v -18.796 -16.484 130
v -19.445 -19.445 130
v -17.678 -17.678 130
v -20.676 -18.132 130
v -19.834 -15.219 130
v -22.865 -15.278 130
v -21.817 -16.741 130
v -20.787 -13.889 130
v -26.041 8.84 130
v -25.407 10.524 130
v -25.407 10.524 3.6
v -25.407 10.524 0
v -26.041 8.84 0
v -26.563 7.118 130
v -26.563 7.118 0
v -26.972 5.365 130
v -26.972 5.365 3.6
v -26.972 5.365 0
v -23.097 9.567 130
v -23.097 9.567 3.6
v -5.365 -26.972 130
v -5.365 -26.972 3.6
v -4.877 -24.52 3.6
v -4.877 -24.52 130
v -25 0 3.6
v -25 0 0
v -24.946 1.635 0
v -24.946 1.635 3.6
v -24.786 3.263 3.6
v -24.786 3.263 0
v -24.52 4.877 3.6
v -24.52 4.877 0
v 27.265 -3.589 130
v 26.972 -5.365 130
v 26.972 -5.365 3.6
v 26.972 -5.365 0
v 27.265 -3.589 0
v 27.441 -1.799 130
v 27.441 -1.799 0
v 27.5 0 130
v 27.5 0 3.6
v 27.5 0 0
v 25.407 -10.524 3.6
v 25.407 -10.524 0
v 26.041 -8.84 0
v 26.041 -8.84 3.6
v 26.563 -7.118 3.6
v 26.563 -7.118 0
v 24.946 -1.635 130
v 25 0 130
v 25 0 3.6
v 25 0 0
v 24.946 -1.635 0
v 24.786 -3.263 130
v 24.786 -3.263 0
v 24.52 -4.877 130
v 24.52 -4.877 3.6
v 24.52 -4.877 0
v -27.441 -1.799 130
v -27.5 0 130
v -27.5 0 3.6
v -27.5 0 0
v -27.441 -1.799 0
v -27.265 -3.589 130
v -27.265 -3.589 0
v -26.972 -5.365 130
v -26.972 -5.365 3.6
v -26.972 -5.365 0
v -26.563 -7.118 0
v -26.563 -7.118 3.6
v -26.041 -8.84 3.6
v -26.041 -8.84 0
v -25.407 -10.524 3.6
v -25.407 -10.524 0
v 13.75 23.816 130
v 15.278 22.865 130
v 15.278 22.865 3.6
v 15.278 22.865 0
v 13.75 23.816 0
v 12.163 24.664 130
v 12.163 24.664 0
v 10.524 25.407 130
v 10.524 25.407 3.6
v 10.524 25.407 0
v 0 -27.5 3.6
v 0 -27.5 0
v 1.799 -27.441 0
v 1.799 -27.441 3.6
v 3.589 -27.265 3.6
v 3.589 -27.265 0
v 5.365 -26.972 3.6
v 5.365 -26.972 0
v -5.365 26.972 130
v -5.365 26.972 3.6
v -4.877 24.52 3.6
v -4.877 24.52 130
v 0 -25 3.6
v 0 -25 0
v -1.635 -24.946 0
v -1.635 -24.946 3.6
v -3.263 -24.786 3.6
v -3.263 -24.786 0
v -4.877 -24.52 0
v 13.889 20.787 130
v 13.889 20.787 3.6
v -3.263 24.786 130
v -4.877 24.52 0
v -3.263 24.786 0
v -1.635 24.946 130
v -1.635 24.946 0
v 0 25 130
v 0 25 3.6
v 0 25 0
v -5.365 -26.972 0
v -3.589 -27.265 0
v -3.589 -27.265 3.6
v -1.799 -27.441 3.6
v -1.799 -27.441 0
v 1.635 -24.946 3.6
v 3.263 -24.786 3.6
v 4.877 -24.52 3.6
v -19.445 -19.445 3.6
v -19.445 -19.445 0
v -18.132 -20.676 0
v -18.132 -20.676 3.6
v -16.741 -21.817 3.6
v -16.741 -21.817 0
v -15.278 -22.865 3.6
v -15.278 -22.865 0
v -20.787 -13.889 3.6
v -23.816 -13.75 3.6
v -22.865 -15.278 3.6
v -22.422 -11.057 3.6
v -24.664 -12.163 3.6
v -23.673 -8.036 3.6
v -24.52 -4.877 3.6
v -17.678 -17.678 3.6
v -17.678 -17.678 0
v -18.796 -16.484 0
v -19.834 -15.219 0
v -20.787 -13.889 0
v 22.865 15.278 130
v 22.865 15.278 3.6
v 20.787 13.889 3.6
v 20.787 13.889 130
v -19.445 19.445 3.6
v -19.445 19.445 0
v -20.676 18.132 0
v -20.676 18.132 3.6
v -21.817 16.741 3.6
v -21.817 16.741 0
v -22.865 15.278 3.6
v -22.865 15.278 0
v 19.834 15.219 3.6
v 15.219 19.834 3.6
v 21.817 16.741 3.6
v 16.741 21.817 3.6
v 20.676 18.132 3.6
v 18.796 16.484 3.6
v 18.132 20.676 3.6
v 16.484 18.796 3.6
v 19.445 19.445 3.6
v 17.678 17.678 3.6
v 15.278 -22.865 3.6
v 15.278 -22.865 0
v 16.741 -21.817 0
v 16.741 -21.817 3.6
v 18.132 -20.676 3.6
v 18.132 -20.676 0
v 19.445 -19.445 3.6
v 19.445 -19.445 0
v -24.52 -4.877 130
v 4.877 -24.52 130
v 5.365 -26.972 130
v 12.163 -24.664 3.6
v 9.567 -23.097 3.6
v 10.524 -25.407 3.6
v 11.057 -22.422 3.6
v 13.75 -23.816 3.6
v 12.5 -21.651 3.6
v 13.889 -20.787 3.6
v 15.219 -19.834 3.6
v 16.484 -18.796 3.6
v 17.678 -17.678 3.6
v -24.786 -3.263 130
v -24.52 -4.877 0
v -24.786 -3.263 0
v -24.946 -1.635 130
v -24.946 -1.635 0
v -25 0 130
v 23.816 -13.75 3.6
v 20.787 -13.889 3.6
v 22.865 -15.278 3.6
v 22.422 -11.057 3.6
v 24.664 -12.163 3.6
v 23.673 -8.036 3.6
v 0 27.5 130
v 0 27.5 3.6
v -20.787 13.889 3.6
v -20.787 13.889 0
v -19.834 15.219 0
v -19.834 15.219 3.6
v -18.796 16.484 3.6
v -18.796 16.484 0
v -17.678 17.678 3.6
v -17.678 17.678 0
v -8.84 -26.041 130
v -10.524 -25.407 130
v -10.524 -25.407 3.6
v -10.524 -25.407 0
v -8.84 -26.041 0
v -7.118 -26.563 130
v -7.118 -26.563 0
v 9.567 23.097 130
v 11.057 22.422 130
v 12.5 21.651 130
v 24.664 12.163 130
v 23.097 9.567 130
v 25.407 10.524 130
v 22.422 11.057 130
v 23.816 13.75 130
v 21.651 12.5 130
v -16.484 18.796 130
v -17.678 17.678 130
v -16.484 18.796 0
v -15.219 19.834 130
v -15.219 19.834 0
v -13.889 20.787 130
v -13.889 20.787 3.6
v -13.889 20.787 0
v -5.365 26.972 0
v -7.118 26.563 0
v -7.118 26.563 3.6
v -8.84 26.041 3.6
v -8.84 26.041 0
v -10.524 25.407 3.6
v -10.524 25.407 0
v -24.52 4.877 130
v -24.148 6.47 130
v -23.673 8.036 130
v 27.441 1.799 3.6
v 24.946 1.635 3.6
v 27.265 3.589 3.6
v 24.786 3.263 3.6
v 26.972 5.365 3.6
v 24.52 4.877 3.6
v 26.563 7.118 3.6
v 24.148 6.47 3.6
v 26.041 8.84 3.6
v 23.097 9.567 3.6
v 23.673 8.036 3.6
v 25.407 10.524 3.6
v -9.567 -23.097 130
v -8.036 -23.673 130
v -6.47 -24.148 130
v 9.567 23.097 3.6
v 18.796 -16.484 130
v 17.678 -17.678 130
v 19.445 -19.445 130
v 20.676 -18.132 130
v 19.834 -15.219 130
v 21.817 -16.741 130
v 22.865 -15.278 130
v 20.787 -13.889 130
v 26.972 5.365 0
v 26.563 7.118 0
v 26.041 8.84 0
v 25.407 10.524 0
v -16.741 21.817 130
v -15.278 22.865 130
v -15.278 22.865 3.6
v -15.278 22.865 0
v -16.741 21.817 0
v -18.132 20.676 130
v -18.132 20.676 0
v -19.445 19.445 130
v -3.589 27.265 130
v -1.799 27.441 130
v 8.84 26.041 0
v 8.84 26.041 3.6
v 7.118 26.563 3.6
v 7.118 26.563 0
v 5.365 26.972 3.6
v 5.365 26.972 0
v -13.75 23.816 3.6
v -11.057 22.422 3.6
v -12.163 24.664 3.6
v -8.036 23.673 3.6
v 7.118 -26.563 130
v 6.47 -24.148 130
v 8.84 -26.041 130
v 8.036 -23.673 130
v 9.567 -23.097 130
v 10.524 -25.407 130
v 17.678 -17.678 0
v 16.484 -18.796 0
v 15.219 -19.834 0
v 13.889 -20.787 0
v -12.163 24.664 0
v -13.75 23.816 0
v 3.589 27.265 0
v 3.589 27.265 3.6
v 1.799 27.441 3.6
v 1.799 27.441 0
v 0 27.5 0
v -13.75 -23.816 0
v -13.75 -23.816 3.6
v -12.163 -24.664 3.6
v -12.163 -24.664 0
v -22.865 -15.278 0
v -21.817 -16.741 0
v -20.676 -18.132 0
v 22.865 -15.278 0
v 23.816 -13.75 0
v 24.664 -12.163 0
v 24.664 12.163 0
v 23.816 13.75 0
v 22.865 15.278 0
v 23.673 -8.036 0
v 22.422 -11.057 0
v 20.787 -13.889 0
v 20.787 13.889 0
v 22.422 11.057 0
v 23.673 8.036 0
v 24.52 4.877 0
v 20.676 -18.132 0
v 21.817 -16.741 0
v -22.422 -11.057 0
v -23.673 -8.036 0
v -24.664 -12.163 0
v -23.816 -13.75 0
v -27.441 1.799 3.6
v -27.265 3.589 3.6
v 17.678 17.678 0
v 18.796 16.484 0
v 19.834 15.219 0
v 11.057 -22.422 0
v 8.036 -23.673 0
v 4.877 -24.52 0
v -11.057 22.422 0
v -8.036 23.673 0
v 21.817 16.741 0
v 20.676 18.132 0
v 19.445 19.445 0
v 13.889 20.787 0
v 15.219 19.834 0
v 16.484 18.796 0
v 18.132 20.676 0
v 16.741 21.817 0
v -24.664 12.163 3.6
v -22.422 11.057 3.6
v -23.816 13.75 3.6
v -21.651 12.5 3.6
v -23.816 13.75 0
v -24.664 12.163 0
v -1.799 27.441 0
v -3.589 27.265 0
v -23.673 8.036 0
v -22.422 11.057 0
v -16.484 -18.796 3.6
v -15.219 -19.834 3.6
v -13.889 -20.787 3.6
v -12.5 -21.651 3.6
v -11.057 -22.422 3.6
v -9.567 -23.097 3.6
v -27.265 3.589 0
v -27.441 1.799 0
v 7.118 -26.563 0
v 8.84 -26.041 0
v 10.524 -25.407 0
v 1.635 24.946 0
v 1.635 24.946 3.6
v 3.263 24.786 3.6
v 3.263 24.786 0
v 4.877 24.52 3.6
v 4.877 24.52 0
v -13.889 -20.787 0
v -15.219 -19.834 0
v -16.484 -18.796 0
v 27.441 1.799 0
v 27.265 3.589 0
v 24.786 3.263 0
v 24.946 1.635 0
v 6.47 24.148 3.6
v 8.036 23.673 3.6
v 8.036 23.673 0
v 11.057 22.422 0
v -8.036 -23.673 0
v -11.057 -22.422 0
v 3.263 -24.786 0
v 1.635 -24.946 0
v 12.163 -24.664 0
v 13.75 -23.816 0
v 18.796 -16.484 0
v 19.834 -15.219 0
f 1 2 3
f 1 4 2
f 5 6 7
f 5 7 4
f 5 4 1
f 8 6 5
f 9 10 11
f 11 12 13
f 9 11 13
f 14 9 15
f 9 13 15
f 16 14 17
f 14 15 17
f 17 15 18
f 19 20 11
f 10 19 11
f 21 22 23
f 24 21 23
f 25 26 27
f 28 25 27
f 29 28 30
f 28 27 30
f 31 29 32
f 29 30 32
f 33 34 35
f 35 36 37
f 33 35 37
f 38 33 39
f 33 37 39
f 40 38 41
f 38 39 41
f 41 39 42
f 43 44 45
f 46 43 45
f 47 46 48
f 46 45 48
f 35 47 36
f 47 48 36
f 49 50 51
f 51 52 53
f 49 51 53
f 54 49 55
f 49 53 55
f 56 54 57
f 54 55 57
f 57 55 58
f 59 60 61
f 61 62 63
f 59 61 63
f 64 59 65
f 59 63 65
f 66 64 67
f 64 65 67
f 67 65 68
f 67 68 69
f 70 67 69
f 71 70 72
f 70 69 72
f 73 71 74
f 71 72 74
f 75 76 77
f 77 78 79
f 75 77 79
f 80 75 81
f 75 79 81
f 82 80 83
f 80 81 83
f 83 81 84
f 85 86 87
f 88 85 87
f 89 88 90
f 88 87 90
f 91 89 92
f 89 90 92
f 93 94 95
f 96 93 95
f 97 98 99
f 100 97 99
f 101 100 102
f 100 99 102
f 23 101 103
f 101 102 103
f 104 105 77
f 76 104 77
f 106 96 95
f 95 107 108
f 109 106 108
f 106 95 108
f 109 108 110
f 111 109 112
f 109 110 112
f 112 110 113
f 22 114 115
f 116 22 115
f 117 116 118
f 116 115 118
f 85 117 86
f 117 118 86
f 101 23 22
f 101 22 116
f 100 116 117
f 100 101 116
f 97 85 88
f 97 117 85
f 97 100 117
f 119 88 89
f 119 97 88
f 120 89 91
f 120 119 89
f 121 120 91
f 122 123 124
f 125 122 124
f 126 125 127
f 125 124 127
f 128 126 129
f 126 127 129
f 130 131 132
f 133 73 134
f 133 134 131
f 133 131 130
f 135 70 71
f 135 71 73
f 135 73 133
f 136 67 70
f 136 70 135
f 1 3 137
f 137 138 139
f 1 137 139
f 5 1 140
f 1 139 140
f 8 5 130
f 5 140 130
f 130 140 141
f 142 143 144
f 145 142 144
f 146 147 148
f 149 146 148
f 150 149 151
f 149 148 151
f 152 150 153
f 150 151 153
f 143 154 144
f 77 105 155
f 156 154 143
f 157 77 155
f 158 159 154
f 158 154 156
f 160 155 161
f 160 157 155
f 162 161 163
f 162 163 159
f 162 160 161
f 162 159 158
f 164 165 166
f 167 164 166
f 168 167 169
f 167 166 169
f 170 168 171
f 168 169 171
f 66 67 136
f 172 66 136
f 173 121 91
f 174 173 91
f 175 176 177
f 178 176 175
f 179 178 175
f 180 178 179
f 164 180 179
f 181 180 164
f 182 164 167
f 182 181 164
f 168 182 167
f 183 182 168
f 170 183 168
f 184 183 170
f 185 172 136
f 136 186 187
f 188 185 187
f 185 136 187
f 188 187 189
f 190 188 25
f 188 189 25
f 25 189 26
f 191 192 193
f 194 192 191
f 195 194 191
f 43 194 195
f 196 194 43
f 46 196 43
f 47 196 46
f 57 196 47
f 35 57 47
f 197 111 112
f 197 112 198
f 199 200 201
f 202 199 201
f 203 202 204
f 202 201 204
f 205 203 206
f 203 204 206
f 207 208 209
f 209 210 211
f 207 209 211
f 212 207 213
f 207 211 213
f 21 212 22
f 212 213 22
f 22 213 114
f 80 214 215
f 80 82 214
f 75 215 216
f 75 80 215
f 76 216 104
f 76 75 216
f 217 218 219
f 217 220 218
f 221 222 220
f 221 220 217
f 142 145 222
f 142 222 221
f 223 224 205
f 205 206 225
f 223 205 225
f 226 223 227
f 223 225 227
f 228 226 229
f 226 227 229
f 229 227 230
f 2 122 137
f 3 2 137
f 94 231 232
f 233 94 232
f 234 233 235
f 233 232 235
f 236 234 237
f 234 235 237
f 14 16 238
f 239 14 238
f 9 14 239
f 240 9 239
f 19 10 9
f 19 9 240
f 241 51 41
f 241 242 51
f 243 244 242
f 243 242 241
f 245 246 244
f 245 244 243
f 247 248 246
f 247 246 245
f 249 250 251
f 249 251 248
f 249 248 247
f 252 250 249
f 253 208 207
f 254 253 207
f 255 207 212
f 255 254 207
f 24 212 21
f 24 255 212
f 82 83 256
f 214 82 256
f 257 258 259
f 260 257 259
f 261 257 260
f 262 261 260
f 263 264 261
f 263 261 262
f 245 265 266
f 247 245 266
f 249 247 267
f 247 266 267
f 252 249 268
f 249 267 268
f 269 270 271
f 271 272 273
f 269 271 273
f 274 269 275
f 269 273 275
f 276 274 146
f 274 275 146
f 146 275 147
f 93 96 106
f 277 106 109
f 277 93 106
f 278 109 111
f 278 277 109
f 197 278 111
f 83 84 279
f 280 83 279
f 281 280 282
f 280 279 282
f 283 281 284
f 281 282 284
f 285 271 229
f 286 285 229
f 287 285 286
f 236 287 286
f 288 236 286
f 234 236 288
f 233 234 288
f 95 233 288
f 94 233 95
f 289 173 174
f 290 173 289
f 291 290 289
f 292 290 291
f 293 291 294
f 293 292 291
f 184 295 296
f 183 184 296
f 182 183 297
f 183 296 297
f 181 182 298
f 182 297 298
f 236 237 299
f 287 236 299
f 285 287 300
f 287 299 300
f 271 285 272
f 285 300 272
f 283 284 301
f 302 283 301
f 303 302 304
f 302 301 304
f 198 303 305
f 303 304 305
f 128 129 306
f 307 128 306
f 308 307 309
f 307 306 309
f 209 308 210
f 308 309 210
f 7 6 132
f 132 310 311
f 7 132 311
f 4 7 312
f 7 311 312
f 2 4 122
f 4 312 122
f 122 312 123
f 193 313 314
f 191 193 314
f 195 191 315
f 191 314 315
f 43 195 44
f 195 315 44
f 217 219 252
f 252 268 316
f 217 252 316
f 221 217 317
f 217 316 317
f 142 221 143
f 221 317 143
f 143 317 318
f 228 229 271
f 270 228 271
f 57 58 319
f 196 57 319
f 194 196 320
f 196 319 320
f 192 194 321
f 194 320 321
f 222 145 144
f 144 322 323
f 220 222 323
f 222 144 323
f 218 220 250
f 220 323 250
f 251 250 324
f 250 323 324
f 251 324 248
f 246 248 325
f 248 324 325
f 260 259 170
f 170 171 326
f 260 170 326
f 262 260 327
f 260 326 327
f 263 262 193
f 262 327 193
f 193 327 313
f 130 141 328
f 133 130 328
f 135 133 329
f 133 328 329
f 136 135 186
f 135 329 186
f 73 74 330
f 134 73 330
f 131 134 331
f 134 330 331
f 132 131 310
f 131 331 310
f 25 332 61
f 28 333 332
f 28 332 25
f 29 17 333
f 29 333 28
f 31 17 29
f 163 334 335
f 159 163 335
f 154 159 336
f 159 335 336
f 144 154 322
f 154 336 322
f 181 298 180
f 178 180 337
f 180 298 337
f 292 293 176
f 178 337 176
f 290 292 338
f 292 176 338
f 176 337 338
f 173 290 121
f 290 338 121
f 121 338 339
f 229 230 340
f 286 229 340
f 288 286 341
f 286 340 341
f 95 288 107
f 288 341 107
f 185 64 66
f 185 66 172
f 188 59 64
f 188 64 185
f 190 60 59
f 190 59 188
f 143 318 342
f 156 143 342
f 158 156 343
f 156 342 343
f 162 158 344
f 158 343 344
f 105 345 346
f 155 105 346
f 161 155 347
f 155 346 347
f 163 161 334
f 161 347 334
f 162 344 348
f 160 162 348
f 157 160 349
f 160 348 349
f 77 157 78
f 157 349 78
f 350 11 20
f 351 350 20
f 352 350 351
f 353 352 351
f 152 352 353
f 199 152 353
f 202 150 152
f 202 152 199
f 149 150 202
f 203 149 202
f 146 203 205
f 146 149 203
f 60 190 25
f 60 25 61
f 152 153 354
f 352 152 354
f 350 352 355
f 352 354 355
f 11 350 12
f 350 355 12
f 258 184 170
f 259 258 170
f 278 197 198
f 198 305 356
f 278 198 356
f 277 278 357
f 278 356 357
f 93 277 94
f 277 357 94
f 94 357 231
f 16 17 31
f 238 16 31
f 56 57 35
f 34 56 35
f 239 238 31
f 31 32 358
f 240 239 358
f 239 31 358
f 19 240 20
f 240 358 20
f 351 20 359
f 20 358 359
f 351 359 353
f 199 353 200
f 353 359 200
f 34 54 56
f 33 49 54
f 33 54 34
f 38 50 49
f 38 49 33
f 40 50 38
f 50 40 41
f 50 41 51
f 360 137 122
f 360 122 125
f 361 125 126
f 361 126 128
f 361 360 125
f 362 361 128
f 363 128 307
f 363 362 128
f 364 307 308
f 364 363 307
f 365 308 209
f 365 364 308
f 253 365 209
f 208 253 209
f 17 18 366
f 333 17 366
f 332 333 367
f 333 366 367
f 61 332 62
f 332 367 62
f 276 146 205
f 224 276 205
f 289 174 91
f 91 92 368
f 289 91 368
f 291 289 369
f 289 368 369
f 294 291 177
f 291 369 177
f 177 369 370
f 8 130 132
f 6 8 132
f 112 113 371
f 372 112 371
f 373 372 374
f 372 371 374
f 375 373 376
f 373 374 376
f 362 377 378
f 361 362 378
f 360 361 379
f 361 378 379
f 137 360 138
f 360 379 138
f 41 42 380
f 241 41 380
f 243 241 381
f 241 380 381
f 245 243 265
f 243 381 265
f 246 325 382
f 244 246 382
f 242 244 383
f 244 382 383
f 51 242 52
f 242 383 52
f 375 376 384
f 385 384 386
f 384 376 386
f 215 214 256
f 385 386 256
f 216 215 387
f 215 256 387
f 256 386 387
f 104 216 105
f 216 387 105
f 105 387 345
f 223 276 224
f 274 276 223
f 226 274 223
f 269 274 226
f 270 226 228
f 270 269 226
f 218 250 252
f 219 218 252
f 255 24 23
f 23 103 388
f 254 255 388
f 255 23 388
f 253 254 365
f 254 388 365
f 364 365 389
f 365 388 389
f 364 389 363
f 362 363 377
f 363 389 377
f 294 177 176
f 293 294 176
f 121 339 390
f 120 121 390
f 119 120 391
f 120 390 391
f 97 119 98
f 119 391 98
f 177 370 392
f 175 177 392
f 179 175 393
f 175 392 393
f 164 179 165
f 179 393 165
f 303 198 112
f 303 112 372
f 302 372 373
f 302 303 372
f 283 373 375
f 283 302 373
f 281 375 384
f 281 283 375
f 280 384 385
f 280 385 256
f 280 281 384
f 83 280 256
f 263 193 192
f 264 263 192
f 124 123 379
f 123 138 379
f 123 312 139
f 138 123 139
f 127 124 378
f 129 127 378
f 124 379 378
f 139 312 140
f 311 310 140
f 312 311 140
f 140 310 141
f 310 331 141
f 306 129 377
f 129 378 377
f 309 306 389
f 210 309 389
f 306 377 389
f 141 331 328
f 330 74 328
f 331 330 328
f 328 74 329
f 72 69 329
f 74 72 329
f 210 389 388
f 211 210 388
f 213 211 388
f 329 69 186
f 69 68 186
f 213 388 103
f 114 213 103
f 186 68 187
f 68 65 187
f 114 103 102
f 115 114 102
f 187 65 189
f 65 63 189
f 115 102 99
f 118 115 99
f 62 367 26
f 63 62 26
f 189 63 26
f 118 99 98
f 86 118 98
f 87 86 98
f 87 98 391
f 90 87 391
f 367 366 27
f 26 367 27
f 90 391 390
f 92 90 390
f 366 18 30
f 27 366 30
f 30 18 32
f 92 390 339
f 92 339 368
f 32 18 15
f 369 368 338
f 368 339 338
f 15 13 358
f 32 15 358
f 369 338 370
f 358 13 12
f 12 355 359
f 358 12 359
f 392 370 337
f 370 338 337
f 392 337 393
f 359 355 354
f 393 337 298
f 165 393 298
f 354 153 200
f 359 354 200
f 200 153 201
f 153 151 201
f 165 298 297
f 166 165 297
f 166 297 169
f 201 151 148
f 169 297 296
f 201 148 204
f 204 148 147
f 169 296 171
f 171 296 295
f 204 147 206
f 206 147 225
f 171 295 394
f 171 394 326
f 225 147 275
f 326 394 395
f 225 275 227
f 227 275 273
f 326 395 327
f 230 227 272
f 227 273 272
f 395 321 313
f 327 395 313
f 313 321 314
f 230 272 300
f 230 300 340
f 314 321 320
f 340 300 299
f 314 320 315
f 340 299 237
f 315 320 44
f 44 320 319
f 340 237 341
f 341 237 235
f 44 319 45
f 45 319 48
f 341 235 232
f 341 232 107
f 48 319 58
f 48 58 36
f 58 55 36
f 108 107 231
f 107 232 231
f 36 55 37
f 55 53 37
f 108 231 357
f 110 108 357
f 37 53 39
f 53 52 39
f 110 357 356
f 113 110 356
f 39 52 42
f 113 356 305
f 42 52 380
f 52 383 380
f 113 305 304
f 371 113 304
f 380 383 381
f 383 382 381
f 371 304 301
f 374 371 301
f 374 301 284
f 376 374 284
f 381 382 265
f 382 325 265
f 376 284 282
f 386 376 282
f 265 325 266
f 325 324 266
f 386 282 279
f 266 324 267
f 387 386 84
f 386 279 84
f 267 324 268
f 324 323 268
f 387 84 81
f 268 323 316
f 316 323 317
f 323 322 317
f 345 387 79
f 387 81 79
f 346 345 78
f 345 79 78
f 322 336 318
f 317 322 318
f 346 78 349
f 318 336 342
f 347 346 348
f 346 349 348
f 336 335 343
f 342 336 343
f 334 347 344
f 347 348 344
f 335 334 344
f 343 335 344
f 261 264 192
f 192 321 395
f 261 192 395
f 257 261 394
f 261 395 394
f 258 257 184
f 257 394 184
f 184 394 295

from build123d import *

# Parameters (mm, degrees)
F2_DEPTH = 3.6
F3_DEPTH = 130


with BuildPart() as f2:
    # F1 (on Top) → F2 (new body)
    with BuildSketch(Plane.XY):
        with BuildLine():
            Line((25, 0), (27.5, 0))
            ThreePointArc((27.5, 0), (27.3675799835, 2.6954713591), (26.9715952111, 5.3649838554))
            Line((26.9715952111, 5.3649838554), (24.5196320101, 4.8772580504))
            ThreePointArc((24.5196320101, 4.8772580504), (24.8796181668, 2.4504285082), (25, 0))
        make_face()
        with BuildLine():
            ThreePointArc((26.9715952111, -5.3649838554), (27.3675799835, -2.6954713591), (27.5, 0))
            Line((27.5, 0), (25, 0))
            ThreePointArc((25, 0), (24.8796181668, -2.4504285082), (24.5196320101, -4.8772580504))
            Line((24.5196320101, -4.8772580504), (26.9715952111, -5.3649838554))
        make_face()
        with BuildLine():
            Line((24.5196320101, 4.8772580504), (26.9715952111, 5.3649838554))
            ThreePointArc((26.9715952111, 5.3649838554), (26.3158592326, 7.9828286245), (25.4066871441, 10.52379439))
            Line((25.4066871441, 10.52379439), (23.0969883128, 9.5670858091))
            ThreePointArc((23.0969883128, 9.5670858091), (23.9235083933, 7.2571169314), (24.5196320101, 4.8772580504))
        make_face()
        with BuildLine():
            ThreePointArc((25.4066871441, -10.52379439), (26.3158592326, -7.9828286245), (26.9715952111, -5.3649838554))
            Line((26.9715952111, -5.3649838554), (24.5196320101, -4.8772580504))
            ThreePointArc((24.5196320101, -4.8772580504), (23.9235083933, -7.2571169314), (23.0969883128, -9.5670858091))
            Line((23.0969883128, -9.5670858091), (25.4066871441, -10.52379439))
        make_face()
        with BuildLine():
            Line((23.0969883128, 9.5670858091), (25.4066871441, 10.52379439))
            ThreePointArc((25.4066871441, 10.52379439), (24.2528347696, 12.9634102627), (22.8654143383, 15.278181408))
            Line((22.8654143383, 15.278181408), (20.7867403076, 13.8892558255))
            ThreePointArc((20.7867403076, 13.8892558255), (22.0480316087, 11.7849184207), (23.0969883128, 9.5670858091))
        make_face()
        with BuildLine():
            ThreePointArc((22.8654143383, -15.278181408), (24.2528347696, -12.9634102627), (25.4066871441, -10.52379439))
            Line((25.4066871441, -10.52379439), (23.0969883128, -9.5670858091))
            ThreePointArc((23.0969883128, -9.5670858091), (22.0480316087, -11.7849184207), (20.7867403076, -13.8892558255))
            Line((20.7867403076, -13.8892558255), (22.8654143383, -15.278181408))
        make_face()
        with BuildLine():
            Line((20.7867403076, 13.8892558255), (22.8654143383, 15.278181408))
            ThreePointArc((22.8654143383, 15.278181408), (21.2577874675, 17.4458153145), (19.4454364826, 19.4454364826))
            Line((19.4454364826, 19.4454364826), (17.6776695297, 17.6776695297))
            ThreePointArc((17.6776695297, 17.6776695297), (19.3252613341, 15.8598321041), (20.7867403076, 13.8892558255))
        make_face()
        with BuildLine():
            ThreePointArc((19.4454364826, -19.4454364826), (21.2577874675, -17.4458153145), (22.8654143383, -15.278181408))
            Line((22.8654143383, -15.278181408), (20.7867403076, -13.8892558255))
            ThreePointArc((20.7867403076, -13.8892558255), (19.3252613341, -15.8598321041), (17.6776695297, -17.6776695297))
            Line((17.6776695297, -17.6776695297), (19.4454364826, -19.4454364826))
        make_face()
        with BuildLine():
            Line((0, 27.5), (0, 25))
            ThreePointArc((0, 25), (2.4504285082, 24.8796181668), (4.8772580504, 24.5196320101))
            Line((4.8772580504, 24.5196320101), (5.3649838554, 26.9715952111))
            ThreePointArc((5.3649838554, 26.9715952111), (2.6954713591, 27.3675799835), (0, 27.5))
        make_face()
        with BuildLine():
            ThreePointArc((-4.8772580504, 24.5196320101), (-2.4504285082, 24.8796181668), (0, 25))
            Line((0, 25), (0, 27.5))
            ThreePointArc((0, 27.5), (-2.6954713591, 27.3675799835), (-5.3649838554, 26.9715952111))
            Line((-5.3649838554, 26.9715952111), (-4.8772580504, 24.5196320101))
        make_face()
        with BuildLine():
            Line((0, -27.5), (0, -25))
            ThreePointArc((0, -25), (-2.4504285082, -24.8796181668), (-4.8772580504, -24.5196320101))
            Line((-4.8772580504, -24.5196320101), (-5.3649838554, -26.9715952111))
            ThreePointArc((-5.3649838554, -26.9715952111), (-2.6954713591, -27.3675799835), (0, -27.5))
        make_face()
        with BuildLine():
            ThreePointArc((4.8772580504, -24.5196320101), (2.4504285082, -24.8796181668), (0, -25))
            Line((0, -25), (0, -27.5))
            ThreePointArc((0, -27.5), (2.6954713591, -27.3675799835), (5.3649838554, -26.9715952111))
            Line((5.3649838554, -26.9715952111), (4.8772580504, -24.5196320101))
        make_face()
        with BuildLine():
            Line((-27.5, 0), (-25, 0))
            ThreePointArc((-25, 0), (-24.8796181668, 2.4504285082), (-24.5196320101, 4.8772580504))
            Line((-24.5196320101, 4.8772580504), (-26.9715952111, 5.3649838554))
            ThreePointArc((-26.9715952111, 5.3649838554), (-27.3675799835, 2.6954713591), (-27.5, 0))
        make_face()
        with BuildLine():
            ThreePointArc((-24.5196320101, -4.8772580504), (-24.8796181668, -2.4504285082), (-25, 0))
            Line((-25, 0), (-27.5, 0))
            ThreePointArc((-27.5, 0), (-27.3675799835, -2.6954713591), (-26.9715952111, -5.3649838554))
            Line((-26.9715952111, -5.3649838554), (-24.5196320101, -4.8772580504))
        make_face()
        with BuildLine():
            Line((19.4454364826, -19.4454364826), (17.6776695297, -17.6776695297))
            ThreePointArc((17.6776695297, -17.6776695297), (15.8598321041, -19.3252613341), (13.8892558255, -20.7867403076))
            Line((13.8892558255, -20.7867403076), (15.278181408, -22.8654143383))
            ThreePointArc((15.278181408, -22.8654143383), (17.4458153145, -21.2577874675), (19.4454364826, -19.4454364826))
        make_face()
        with BuildLine():
            Line((10.52379439, -25.4066871441), (9.5670858091, -23.0969883128))
            ThreePointArc((9.5670858091, -23.0969883128), (7.2571169314, -23.9235083933), (4.8772580504, -24.5196320101))
            Line((4.8772580504, -24.5196320101), (5.3649838554, -26.9715952111))
            ThreePointArc((5.3649838554, -26.9715952111), (7.9828286245, -26.3158592326), (10.52379439, -25.4066871441))
        make_face()
        with BuildLine():
            ThreePointArc((13.8892558255, -20.7867403076), (11.7849184207, -22.0480316087), (9.5670858091, -23.0969883128))
            Line((9.5670858091, -23.0969883128), (10.52379439, -25.4066871441))
            ThreePointArc((10.52379439, -25.4066871441), (12.9634102627, -24.2528347696), (15.278181408, -22.8654143383))
            Line((15.278181408, -22.8654143383), (13.8892558255, -20.7867403076))
        make_face()
        with BuildLine():
            Line((-5.3649838554, -26.9715952111), (-4.8772580504, -24.5196320101))
            ThreePointArc((-4.8772580504, -24.5196320101), (-7.2571169314, -23.9235083933), (-9.5670858091, -23.0969883128))
            Line((-9.5670858091, -23.0969883128), (-10.52379439, -25.4066871441))
            ThreePointArc((-10.52379439, -25.4066871441), (-7.9828286245, -26.3158592326), (-5.3649838554, -26.9715952111))
        make_face()
        with BuildLine():
            Line((-10.52379439, -25.4066871441), (-9.5670858091, -23.0969883128))
            ThreePointArc((-9.5670858091, -23.0969883128), (-11.7849184207, -22.0480316087), (-13.8892558255, -20.7867403076))
            Line((-13.8892558255, -20.7867403076), (-15.278181408, -22.8654143383))
            ThreePointArc((-15.278181408, -22.8654143383), (-12.9634102627, -24.2528347696), (-10.52379439, -25.4066871441))
        make_face()
        with BuildLine():
            Line((-15.278181408, -22.8654143383), (-13.8892558255, -20.7867403076))
            ThreePointArc((-13.8892558255, -20.7867403076), (-15.8598321041, -19.3252613341), (-17.6776695297, -17.6776695297))
            Line((-17.6776695297, -17.6776695297), (-19.4454364826, -19.4454364826))
            ThreePointArc((-19.4454364826, -19.4454364826), (-17.4458153145, -21.2577874675), (-15.278181408, -22.8654143383))
        make_face()
        with BuildLine():
            Line((-19.4454364826, -19.4454364826), (-17.6776695297, -17.6776695297))
            ThreePointArc((-17.6776695297, -17.6776695297), (-19.3252613341, -15.8598321041), (-20.7867403076, -13.8892558255))
            Line((-20.7867403076, -13.8892558255), (-22.8654143383, -15.278181408))
            ThreePointArc((-22.8654143383, -15.278181408), (-21.2577874675, -17.4458153145), (-19.4454364826, -19.4454364826))
        make_face()
        with BuildLine():
            Line((-22.8654143383, -15.278181408), (-20.7867403076, -13.8892558255))
            ThreePointArc((-20.7867403076, -13.8892558255), (-22.0480316087, -11.7849184207), (-23.0969883128, -9.5670858091))
            Line((-23.0969883128, -9.5670858091), (-25.4066871441, -10.52379439))
            ThreePointArc((-25.4066871441, -10.52379439), (-24.2528347696, -12.9634102627), (-22.8654143383, -15.278181408))
        make_face()
        with BuildLine():
            Line((-25.4066871441, -10.52379439), (-23.0969883128, -9.5670858091))
            ThreePointArc((-23.0969883128, -9.5670858091), (-23.9235083933, -7.2571169314), (-24.5196320101, -4.8772580504))
            Line((-24.5196320101, -4.8772580504), (-26.9715952111, -5.3649838554))
            ThreePointArc((-26.9715952111, -5.3649838554), (-26.3158592326, -7.9828286245), (-25.4066871441, -10.52379439))
        make_face()
        with BuildLine():
            Line((-26.9715952111, 5.3649838554), (-24.5196320101, 4.8772580504))
            ThreePointArc((-24.5196320101, 4.8772580504), (-23.9235083933, 7.2571169314), (-23.0969883128, 9.5670858091))
            Line((-23.0969883128, 9.5670858091), (-25.4066871441, 10.52379439))
            ThreePointArc((-25.4066871441, 10.52379439), (-26.3158592326, 7.9828286245), (-26.9715952111, 5.3649838554))
        make_face()
        with BuildLine():
            Line((-25.4066871441, 10.52379439), (-23.0969883128, 9.5670858091))
            ThreePointArc((-23.0969883128, 9.5670858091), (-22.0480316087, 11.7849184207), (-20.7867403076, 13.8892558255))
            Line((-20.7867403076, 13.8892558255), (-22.8654143383, 15.278181408))
            ThreePointArc((-22.8654143383, 15.278181408), (-24.2528347696, 12.9634102627), (-25.4066871441, 10.52379439))
        make_face()
        with BuildLine():
            Line((-22.8654143383, 15.278181408), (-20.7867403076, 13.8892558255))
            ThreePointArc((-20.7867403076, 13.8892558255), (-19.3252613341, 15.8598321041), (-17.6776695297, 17.6776695297))
            Line((-17.6776695297, 17.6776695297), (-19.4454364826, 19.4454364826))
            ThreePointArc((-19.4454364826, 19.4454364826), (-21.2577874675, 17.4458153145), (-22.8654143383, 15.278181408))
        make_face()
        with BuildLine():
            Line((-19.4454364826, 19.4454364826), (-17.6776695297, 17.6776695297))
            ThreePointArc((-17.6776695297, 17.6776695297), (-15.8598321041, 19.3252613341), (-13.8892558255, 20.7867403076))
            Line((-13.8892558255, 20.7867403076), (-15.278181408, 22.8654143383))
            ThreePointArc((-15.278181408, 22.8654143383), (-17.4458153145, 21.2577874675), (-19.4454364826, 19.4454364826))
        make_face()
        with BuildLine():
            Line((-15.278181408, 22.8654143383), (-13.8892558255, 20.7867403076))
            ThreePointArc((-13.8892558255, 20.7867403076), (-11.7849184207, 22.0480316087), (-9.5670858091, 23.0969883128))
            Line((-9.5670858091, 23.0969883128), (-10.52379439, 25.4066871441))
            ThreePointArc((-10.52379439, 25.4066871441), (-12.9634102627, 24.2528347696), (-15.278181408, 22.8654143383))
        make_face()
        with BuildLine():
            Line((-10.52379439, 25.4066871441), (-9.5670858091, 23.0969883128))
            ThreePointArc((-9.5670858091, 23.0969883128), (-7.2571169314, 23.9235083933), (-4.8772580504, 24.5196320101))
            Line((-4.8772580504, 24.5196320101), (-5.3649838554, 26.9715952111))
            ThreePointArc((-5.3649838554, 26.9715952111), (-7.9828286245, 26.3158592326), (-10.52379439, 25.4066871441))
        make_face()
        with BuildLine():
            ThreePointArc((13.8892558255, 20.7867403076), (15.8598321041, 19.3252613341), (17.6776695297, 17.6776695297))
            Line((17.6776695297, 17.6776695297), (19.4454364826, 19.4454364826))
            ThreePointArc((19.4454364826, 19.4454364826), (17.4458153145, 21.2577874675), (15.278181408, 22.8654143383))
            Line((15.278181408, 22.8654143383), (13.8892558255, 20.7867403076))
        make_face()
        with BuildLine():
            ThreePointArc((9.5670858091, 23.0969883128), (11.7849184207, 22.0480316087), (13.8892558255, 20.7867403076))
            Line((13.8892558255, 20.7867403076), (15.278181408, 22.8654143383))
            ThreePointArc((15.278181408, 22.8654143383), (12.9634102627, 24.2528347696), (10.52379439, 25.4066871441))
            Line((10.52379439, 25.4066871441), (9.5670858091, 23.0969883128))
        make_face()
        with BuildLine():
            ThreePointArc((4.8772580504, 24.5196320101), (7.2571169314, 23.9235083933), (9.5670858091, 23.0969883128))
            Line((9.5670858091, 23.0969883128), (10.52379439, 25.4066871441))
            ThreePointArc((10.52379439, 25.4066871441), (7.9828286245, 26.3158592326), (5.3649838554, 26.9715952111))
            Line((5.3649838554, 26.9715952111), (4.8772580504, 24.5196320101))
        make_face()
    extrude(amount=F2_DEPTH)

    # F1 (on Top) → F3 (join)
    with BuildSketch(Plane.XY):
        with BuildLine():
            ThreePointArc((26.9715952111, -5.3649838554), (27.3675799835, -2.6954713591), (27.5, 0))
            Line((27.5, 0), (25, 0))
            ThreePointArc((25, 0), (24.8796181668, -2.4504285082), (24.5196320101, -4.8772580504))
            Line((24.5196320101, -4.8772580504), (26.9715952111, -5.3649838554))
        make_face()
        with BuildLine():
            ThreePointArc((19.4454364826, -19.4454364826), (21.2577874675, -17.4458153145), (22.8654143383, -15.278181408))
            Line((22.8654143383, -15.278181408), (20.7867403076, -13.8892558255))
            ThreePointArc((20.7867403076, -13.8892558255), (19.3252613341, -15.8598321041), (17.6776695297, -17.6776695297))
            Line((17.6776695297, -17.6776695297), (19.4454364826, -19.4454364826))
        make_face()
        with BuildLine():
            Line((10.52379439, -25.4066871441), (9.5670858091, -23.0969883128))
            ThreePointArc((9.5670858091, -23.0969883128), (7.2571169314, -23.9235083933), (4.8772580504, -24.5196320101))
            Line((4.8772580504, -24.5196320101), (5.3649838554, -26.9715952111))
            ThreePointArc((5.3649838554, -26.9715952111), (7.9828286245, -26.3158592326), (10.52379439, -25.4066871441))
        make_face()
        with BuildLine():
            Line((23.0969883128, 9.5670858091), (25.4066871441, 10.52379439))
            ThreePointArc((25.4066871441, 10.52379439), (24.2528347696, 12.9634102627), (22.8654143383, 15.278181408))
            Line((22.8654143383, 15.278181408), (20.7867403076, 13.8892558255))
            ThreePointArc((20.7867403076, 13.8892558255), (22.0480316087, 11.7849184207), (23.0969883128, 9.5670858091))
        make_face()
        with BuildLine():
            ThreePointArc((9.5670858091, 23.0969883128), (11.7849184207, 22.0480316087), (13.8892558255, 20.7867403076))
            Line((13.8892558255, 20.7867403076), (15.278181408, 22.8654143383))
            ThreePointArc((15.278181408, 22.8654143383), (12.9634102627, 24.2528347696), (10.52379439, 25.4066871441))
            Line((10.52379439, 25.4066871441), (9.5670858091, 23.0969883128))
        make_face()
        with BuildLine():
            ThreePointArc((-4.8772580504, 24.5196320101), (-2.4504285082, 24.8796181668), (0, 25))
            Line((0, 25), (0, 27.5))
            ThreePointArc((0, 27.5), (-2.6954713591, 27.3675799835), (-5.3649838554, 26.9715952111))
            Line((-5.3649838554, 26.9715952111), (-4.8772580504, 24.5196320101))
        make_face()
        with BuildLine():
            Line((-5.3649838554, -26.9715952111), (-4.8772580504, -24.5196320101))
            ThreePointArc((-4.8772580504, -24.5196320101), (-7.2571169314, -23.9235083933), (-9.5670858091, -23.0969883128))
            Line((-9.5670858091, -23.0969883128), (-10.52379439, -25.4066871441))
            ThreePointArc((-10.52379439, -25.4066871441), (-7.9828286245, -26.3158592326), (-5.3649838554, -26.9715952111))
        make_face()
        with BuildLine():
            Line((-19.4454364826, 19.4454364826), (-17.6776695297, 17.6776695297))
            ThreePointArc((-17.6776695297, 17.6776695297), (-15.8598321041, 19.3252613341), (-13.8892558255, 20.7867403076))
            Line((-13.8892558255, 20.7867403076), (-15.278181408, 22.8654143383))
            ThreePointArc((-15.278181408, 22.8654143383), (-17.4458153145, 21.2577874675), (-19.4454364826, 19.4454364826))
        make_face()
        with BuildLine():
            Line((-26.9715952111, 5.3649838554), (-24.5196320101, 4.8772580504))
            ThreePointArc((-24.5196320101, 4.8772580504), (-23.9235083933, 7.2571169314), (-23.0969883128, 9.5670858091))
            Line((-23.0969883128, 9.5670858091), (-25.4066871441, 10.52379439))
            ThreePointArc((-25.4066871441, 10.52379439), (-26.3158592326, 7.9828286245), (-26.9715952111, 5.3649838554))
        make_face()
        with BuildLine():
            Line((-19.4454364826, -19.4454364826), (-17.6776695297, -17.6776695297))
            ThreePointArc((-17.6776695297, -17.6776695297), (-19.3252613341, -15.8598321041), (-20.7867403076, -13.8892558255))
            Line((-20.7867403076, -13.8892558255), (-22.8654143383, -15.278181408))
            ThreePointArc((-22.8654143383, -15.278181408), (-21.2577874675, -17.4458153145), (-19.4454364826, -19.4454364826))
        make_face()
        with BuildLine():
            ThreePointArc((-24.5196320101, -4.8772580504), (-24.8796181668, -2.4504285082), (-25, 0))
            Line((-25, 0), (-27.5, 0))
            ThreePointArc((-27.5, 0), (-27.3675799835, -2.6954713591), (-26.9715952111, -5.3649838554))
            Line((-26.9715952111, -5.3649838554), (-24.5196320101, -4.8772580504))
        make_face()
    extrude(amount=F3_DEPTH)


solid = f2.part
